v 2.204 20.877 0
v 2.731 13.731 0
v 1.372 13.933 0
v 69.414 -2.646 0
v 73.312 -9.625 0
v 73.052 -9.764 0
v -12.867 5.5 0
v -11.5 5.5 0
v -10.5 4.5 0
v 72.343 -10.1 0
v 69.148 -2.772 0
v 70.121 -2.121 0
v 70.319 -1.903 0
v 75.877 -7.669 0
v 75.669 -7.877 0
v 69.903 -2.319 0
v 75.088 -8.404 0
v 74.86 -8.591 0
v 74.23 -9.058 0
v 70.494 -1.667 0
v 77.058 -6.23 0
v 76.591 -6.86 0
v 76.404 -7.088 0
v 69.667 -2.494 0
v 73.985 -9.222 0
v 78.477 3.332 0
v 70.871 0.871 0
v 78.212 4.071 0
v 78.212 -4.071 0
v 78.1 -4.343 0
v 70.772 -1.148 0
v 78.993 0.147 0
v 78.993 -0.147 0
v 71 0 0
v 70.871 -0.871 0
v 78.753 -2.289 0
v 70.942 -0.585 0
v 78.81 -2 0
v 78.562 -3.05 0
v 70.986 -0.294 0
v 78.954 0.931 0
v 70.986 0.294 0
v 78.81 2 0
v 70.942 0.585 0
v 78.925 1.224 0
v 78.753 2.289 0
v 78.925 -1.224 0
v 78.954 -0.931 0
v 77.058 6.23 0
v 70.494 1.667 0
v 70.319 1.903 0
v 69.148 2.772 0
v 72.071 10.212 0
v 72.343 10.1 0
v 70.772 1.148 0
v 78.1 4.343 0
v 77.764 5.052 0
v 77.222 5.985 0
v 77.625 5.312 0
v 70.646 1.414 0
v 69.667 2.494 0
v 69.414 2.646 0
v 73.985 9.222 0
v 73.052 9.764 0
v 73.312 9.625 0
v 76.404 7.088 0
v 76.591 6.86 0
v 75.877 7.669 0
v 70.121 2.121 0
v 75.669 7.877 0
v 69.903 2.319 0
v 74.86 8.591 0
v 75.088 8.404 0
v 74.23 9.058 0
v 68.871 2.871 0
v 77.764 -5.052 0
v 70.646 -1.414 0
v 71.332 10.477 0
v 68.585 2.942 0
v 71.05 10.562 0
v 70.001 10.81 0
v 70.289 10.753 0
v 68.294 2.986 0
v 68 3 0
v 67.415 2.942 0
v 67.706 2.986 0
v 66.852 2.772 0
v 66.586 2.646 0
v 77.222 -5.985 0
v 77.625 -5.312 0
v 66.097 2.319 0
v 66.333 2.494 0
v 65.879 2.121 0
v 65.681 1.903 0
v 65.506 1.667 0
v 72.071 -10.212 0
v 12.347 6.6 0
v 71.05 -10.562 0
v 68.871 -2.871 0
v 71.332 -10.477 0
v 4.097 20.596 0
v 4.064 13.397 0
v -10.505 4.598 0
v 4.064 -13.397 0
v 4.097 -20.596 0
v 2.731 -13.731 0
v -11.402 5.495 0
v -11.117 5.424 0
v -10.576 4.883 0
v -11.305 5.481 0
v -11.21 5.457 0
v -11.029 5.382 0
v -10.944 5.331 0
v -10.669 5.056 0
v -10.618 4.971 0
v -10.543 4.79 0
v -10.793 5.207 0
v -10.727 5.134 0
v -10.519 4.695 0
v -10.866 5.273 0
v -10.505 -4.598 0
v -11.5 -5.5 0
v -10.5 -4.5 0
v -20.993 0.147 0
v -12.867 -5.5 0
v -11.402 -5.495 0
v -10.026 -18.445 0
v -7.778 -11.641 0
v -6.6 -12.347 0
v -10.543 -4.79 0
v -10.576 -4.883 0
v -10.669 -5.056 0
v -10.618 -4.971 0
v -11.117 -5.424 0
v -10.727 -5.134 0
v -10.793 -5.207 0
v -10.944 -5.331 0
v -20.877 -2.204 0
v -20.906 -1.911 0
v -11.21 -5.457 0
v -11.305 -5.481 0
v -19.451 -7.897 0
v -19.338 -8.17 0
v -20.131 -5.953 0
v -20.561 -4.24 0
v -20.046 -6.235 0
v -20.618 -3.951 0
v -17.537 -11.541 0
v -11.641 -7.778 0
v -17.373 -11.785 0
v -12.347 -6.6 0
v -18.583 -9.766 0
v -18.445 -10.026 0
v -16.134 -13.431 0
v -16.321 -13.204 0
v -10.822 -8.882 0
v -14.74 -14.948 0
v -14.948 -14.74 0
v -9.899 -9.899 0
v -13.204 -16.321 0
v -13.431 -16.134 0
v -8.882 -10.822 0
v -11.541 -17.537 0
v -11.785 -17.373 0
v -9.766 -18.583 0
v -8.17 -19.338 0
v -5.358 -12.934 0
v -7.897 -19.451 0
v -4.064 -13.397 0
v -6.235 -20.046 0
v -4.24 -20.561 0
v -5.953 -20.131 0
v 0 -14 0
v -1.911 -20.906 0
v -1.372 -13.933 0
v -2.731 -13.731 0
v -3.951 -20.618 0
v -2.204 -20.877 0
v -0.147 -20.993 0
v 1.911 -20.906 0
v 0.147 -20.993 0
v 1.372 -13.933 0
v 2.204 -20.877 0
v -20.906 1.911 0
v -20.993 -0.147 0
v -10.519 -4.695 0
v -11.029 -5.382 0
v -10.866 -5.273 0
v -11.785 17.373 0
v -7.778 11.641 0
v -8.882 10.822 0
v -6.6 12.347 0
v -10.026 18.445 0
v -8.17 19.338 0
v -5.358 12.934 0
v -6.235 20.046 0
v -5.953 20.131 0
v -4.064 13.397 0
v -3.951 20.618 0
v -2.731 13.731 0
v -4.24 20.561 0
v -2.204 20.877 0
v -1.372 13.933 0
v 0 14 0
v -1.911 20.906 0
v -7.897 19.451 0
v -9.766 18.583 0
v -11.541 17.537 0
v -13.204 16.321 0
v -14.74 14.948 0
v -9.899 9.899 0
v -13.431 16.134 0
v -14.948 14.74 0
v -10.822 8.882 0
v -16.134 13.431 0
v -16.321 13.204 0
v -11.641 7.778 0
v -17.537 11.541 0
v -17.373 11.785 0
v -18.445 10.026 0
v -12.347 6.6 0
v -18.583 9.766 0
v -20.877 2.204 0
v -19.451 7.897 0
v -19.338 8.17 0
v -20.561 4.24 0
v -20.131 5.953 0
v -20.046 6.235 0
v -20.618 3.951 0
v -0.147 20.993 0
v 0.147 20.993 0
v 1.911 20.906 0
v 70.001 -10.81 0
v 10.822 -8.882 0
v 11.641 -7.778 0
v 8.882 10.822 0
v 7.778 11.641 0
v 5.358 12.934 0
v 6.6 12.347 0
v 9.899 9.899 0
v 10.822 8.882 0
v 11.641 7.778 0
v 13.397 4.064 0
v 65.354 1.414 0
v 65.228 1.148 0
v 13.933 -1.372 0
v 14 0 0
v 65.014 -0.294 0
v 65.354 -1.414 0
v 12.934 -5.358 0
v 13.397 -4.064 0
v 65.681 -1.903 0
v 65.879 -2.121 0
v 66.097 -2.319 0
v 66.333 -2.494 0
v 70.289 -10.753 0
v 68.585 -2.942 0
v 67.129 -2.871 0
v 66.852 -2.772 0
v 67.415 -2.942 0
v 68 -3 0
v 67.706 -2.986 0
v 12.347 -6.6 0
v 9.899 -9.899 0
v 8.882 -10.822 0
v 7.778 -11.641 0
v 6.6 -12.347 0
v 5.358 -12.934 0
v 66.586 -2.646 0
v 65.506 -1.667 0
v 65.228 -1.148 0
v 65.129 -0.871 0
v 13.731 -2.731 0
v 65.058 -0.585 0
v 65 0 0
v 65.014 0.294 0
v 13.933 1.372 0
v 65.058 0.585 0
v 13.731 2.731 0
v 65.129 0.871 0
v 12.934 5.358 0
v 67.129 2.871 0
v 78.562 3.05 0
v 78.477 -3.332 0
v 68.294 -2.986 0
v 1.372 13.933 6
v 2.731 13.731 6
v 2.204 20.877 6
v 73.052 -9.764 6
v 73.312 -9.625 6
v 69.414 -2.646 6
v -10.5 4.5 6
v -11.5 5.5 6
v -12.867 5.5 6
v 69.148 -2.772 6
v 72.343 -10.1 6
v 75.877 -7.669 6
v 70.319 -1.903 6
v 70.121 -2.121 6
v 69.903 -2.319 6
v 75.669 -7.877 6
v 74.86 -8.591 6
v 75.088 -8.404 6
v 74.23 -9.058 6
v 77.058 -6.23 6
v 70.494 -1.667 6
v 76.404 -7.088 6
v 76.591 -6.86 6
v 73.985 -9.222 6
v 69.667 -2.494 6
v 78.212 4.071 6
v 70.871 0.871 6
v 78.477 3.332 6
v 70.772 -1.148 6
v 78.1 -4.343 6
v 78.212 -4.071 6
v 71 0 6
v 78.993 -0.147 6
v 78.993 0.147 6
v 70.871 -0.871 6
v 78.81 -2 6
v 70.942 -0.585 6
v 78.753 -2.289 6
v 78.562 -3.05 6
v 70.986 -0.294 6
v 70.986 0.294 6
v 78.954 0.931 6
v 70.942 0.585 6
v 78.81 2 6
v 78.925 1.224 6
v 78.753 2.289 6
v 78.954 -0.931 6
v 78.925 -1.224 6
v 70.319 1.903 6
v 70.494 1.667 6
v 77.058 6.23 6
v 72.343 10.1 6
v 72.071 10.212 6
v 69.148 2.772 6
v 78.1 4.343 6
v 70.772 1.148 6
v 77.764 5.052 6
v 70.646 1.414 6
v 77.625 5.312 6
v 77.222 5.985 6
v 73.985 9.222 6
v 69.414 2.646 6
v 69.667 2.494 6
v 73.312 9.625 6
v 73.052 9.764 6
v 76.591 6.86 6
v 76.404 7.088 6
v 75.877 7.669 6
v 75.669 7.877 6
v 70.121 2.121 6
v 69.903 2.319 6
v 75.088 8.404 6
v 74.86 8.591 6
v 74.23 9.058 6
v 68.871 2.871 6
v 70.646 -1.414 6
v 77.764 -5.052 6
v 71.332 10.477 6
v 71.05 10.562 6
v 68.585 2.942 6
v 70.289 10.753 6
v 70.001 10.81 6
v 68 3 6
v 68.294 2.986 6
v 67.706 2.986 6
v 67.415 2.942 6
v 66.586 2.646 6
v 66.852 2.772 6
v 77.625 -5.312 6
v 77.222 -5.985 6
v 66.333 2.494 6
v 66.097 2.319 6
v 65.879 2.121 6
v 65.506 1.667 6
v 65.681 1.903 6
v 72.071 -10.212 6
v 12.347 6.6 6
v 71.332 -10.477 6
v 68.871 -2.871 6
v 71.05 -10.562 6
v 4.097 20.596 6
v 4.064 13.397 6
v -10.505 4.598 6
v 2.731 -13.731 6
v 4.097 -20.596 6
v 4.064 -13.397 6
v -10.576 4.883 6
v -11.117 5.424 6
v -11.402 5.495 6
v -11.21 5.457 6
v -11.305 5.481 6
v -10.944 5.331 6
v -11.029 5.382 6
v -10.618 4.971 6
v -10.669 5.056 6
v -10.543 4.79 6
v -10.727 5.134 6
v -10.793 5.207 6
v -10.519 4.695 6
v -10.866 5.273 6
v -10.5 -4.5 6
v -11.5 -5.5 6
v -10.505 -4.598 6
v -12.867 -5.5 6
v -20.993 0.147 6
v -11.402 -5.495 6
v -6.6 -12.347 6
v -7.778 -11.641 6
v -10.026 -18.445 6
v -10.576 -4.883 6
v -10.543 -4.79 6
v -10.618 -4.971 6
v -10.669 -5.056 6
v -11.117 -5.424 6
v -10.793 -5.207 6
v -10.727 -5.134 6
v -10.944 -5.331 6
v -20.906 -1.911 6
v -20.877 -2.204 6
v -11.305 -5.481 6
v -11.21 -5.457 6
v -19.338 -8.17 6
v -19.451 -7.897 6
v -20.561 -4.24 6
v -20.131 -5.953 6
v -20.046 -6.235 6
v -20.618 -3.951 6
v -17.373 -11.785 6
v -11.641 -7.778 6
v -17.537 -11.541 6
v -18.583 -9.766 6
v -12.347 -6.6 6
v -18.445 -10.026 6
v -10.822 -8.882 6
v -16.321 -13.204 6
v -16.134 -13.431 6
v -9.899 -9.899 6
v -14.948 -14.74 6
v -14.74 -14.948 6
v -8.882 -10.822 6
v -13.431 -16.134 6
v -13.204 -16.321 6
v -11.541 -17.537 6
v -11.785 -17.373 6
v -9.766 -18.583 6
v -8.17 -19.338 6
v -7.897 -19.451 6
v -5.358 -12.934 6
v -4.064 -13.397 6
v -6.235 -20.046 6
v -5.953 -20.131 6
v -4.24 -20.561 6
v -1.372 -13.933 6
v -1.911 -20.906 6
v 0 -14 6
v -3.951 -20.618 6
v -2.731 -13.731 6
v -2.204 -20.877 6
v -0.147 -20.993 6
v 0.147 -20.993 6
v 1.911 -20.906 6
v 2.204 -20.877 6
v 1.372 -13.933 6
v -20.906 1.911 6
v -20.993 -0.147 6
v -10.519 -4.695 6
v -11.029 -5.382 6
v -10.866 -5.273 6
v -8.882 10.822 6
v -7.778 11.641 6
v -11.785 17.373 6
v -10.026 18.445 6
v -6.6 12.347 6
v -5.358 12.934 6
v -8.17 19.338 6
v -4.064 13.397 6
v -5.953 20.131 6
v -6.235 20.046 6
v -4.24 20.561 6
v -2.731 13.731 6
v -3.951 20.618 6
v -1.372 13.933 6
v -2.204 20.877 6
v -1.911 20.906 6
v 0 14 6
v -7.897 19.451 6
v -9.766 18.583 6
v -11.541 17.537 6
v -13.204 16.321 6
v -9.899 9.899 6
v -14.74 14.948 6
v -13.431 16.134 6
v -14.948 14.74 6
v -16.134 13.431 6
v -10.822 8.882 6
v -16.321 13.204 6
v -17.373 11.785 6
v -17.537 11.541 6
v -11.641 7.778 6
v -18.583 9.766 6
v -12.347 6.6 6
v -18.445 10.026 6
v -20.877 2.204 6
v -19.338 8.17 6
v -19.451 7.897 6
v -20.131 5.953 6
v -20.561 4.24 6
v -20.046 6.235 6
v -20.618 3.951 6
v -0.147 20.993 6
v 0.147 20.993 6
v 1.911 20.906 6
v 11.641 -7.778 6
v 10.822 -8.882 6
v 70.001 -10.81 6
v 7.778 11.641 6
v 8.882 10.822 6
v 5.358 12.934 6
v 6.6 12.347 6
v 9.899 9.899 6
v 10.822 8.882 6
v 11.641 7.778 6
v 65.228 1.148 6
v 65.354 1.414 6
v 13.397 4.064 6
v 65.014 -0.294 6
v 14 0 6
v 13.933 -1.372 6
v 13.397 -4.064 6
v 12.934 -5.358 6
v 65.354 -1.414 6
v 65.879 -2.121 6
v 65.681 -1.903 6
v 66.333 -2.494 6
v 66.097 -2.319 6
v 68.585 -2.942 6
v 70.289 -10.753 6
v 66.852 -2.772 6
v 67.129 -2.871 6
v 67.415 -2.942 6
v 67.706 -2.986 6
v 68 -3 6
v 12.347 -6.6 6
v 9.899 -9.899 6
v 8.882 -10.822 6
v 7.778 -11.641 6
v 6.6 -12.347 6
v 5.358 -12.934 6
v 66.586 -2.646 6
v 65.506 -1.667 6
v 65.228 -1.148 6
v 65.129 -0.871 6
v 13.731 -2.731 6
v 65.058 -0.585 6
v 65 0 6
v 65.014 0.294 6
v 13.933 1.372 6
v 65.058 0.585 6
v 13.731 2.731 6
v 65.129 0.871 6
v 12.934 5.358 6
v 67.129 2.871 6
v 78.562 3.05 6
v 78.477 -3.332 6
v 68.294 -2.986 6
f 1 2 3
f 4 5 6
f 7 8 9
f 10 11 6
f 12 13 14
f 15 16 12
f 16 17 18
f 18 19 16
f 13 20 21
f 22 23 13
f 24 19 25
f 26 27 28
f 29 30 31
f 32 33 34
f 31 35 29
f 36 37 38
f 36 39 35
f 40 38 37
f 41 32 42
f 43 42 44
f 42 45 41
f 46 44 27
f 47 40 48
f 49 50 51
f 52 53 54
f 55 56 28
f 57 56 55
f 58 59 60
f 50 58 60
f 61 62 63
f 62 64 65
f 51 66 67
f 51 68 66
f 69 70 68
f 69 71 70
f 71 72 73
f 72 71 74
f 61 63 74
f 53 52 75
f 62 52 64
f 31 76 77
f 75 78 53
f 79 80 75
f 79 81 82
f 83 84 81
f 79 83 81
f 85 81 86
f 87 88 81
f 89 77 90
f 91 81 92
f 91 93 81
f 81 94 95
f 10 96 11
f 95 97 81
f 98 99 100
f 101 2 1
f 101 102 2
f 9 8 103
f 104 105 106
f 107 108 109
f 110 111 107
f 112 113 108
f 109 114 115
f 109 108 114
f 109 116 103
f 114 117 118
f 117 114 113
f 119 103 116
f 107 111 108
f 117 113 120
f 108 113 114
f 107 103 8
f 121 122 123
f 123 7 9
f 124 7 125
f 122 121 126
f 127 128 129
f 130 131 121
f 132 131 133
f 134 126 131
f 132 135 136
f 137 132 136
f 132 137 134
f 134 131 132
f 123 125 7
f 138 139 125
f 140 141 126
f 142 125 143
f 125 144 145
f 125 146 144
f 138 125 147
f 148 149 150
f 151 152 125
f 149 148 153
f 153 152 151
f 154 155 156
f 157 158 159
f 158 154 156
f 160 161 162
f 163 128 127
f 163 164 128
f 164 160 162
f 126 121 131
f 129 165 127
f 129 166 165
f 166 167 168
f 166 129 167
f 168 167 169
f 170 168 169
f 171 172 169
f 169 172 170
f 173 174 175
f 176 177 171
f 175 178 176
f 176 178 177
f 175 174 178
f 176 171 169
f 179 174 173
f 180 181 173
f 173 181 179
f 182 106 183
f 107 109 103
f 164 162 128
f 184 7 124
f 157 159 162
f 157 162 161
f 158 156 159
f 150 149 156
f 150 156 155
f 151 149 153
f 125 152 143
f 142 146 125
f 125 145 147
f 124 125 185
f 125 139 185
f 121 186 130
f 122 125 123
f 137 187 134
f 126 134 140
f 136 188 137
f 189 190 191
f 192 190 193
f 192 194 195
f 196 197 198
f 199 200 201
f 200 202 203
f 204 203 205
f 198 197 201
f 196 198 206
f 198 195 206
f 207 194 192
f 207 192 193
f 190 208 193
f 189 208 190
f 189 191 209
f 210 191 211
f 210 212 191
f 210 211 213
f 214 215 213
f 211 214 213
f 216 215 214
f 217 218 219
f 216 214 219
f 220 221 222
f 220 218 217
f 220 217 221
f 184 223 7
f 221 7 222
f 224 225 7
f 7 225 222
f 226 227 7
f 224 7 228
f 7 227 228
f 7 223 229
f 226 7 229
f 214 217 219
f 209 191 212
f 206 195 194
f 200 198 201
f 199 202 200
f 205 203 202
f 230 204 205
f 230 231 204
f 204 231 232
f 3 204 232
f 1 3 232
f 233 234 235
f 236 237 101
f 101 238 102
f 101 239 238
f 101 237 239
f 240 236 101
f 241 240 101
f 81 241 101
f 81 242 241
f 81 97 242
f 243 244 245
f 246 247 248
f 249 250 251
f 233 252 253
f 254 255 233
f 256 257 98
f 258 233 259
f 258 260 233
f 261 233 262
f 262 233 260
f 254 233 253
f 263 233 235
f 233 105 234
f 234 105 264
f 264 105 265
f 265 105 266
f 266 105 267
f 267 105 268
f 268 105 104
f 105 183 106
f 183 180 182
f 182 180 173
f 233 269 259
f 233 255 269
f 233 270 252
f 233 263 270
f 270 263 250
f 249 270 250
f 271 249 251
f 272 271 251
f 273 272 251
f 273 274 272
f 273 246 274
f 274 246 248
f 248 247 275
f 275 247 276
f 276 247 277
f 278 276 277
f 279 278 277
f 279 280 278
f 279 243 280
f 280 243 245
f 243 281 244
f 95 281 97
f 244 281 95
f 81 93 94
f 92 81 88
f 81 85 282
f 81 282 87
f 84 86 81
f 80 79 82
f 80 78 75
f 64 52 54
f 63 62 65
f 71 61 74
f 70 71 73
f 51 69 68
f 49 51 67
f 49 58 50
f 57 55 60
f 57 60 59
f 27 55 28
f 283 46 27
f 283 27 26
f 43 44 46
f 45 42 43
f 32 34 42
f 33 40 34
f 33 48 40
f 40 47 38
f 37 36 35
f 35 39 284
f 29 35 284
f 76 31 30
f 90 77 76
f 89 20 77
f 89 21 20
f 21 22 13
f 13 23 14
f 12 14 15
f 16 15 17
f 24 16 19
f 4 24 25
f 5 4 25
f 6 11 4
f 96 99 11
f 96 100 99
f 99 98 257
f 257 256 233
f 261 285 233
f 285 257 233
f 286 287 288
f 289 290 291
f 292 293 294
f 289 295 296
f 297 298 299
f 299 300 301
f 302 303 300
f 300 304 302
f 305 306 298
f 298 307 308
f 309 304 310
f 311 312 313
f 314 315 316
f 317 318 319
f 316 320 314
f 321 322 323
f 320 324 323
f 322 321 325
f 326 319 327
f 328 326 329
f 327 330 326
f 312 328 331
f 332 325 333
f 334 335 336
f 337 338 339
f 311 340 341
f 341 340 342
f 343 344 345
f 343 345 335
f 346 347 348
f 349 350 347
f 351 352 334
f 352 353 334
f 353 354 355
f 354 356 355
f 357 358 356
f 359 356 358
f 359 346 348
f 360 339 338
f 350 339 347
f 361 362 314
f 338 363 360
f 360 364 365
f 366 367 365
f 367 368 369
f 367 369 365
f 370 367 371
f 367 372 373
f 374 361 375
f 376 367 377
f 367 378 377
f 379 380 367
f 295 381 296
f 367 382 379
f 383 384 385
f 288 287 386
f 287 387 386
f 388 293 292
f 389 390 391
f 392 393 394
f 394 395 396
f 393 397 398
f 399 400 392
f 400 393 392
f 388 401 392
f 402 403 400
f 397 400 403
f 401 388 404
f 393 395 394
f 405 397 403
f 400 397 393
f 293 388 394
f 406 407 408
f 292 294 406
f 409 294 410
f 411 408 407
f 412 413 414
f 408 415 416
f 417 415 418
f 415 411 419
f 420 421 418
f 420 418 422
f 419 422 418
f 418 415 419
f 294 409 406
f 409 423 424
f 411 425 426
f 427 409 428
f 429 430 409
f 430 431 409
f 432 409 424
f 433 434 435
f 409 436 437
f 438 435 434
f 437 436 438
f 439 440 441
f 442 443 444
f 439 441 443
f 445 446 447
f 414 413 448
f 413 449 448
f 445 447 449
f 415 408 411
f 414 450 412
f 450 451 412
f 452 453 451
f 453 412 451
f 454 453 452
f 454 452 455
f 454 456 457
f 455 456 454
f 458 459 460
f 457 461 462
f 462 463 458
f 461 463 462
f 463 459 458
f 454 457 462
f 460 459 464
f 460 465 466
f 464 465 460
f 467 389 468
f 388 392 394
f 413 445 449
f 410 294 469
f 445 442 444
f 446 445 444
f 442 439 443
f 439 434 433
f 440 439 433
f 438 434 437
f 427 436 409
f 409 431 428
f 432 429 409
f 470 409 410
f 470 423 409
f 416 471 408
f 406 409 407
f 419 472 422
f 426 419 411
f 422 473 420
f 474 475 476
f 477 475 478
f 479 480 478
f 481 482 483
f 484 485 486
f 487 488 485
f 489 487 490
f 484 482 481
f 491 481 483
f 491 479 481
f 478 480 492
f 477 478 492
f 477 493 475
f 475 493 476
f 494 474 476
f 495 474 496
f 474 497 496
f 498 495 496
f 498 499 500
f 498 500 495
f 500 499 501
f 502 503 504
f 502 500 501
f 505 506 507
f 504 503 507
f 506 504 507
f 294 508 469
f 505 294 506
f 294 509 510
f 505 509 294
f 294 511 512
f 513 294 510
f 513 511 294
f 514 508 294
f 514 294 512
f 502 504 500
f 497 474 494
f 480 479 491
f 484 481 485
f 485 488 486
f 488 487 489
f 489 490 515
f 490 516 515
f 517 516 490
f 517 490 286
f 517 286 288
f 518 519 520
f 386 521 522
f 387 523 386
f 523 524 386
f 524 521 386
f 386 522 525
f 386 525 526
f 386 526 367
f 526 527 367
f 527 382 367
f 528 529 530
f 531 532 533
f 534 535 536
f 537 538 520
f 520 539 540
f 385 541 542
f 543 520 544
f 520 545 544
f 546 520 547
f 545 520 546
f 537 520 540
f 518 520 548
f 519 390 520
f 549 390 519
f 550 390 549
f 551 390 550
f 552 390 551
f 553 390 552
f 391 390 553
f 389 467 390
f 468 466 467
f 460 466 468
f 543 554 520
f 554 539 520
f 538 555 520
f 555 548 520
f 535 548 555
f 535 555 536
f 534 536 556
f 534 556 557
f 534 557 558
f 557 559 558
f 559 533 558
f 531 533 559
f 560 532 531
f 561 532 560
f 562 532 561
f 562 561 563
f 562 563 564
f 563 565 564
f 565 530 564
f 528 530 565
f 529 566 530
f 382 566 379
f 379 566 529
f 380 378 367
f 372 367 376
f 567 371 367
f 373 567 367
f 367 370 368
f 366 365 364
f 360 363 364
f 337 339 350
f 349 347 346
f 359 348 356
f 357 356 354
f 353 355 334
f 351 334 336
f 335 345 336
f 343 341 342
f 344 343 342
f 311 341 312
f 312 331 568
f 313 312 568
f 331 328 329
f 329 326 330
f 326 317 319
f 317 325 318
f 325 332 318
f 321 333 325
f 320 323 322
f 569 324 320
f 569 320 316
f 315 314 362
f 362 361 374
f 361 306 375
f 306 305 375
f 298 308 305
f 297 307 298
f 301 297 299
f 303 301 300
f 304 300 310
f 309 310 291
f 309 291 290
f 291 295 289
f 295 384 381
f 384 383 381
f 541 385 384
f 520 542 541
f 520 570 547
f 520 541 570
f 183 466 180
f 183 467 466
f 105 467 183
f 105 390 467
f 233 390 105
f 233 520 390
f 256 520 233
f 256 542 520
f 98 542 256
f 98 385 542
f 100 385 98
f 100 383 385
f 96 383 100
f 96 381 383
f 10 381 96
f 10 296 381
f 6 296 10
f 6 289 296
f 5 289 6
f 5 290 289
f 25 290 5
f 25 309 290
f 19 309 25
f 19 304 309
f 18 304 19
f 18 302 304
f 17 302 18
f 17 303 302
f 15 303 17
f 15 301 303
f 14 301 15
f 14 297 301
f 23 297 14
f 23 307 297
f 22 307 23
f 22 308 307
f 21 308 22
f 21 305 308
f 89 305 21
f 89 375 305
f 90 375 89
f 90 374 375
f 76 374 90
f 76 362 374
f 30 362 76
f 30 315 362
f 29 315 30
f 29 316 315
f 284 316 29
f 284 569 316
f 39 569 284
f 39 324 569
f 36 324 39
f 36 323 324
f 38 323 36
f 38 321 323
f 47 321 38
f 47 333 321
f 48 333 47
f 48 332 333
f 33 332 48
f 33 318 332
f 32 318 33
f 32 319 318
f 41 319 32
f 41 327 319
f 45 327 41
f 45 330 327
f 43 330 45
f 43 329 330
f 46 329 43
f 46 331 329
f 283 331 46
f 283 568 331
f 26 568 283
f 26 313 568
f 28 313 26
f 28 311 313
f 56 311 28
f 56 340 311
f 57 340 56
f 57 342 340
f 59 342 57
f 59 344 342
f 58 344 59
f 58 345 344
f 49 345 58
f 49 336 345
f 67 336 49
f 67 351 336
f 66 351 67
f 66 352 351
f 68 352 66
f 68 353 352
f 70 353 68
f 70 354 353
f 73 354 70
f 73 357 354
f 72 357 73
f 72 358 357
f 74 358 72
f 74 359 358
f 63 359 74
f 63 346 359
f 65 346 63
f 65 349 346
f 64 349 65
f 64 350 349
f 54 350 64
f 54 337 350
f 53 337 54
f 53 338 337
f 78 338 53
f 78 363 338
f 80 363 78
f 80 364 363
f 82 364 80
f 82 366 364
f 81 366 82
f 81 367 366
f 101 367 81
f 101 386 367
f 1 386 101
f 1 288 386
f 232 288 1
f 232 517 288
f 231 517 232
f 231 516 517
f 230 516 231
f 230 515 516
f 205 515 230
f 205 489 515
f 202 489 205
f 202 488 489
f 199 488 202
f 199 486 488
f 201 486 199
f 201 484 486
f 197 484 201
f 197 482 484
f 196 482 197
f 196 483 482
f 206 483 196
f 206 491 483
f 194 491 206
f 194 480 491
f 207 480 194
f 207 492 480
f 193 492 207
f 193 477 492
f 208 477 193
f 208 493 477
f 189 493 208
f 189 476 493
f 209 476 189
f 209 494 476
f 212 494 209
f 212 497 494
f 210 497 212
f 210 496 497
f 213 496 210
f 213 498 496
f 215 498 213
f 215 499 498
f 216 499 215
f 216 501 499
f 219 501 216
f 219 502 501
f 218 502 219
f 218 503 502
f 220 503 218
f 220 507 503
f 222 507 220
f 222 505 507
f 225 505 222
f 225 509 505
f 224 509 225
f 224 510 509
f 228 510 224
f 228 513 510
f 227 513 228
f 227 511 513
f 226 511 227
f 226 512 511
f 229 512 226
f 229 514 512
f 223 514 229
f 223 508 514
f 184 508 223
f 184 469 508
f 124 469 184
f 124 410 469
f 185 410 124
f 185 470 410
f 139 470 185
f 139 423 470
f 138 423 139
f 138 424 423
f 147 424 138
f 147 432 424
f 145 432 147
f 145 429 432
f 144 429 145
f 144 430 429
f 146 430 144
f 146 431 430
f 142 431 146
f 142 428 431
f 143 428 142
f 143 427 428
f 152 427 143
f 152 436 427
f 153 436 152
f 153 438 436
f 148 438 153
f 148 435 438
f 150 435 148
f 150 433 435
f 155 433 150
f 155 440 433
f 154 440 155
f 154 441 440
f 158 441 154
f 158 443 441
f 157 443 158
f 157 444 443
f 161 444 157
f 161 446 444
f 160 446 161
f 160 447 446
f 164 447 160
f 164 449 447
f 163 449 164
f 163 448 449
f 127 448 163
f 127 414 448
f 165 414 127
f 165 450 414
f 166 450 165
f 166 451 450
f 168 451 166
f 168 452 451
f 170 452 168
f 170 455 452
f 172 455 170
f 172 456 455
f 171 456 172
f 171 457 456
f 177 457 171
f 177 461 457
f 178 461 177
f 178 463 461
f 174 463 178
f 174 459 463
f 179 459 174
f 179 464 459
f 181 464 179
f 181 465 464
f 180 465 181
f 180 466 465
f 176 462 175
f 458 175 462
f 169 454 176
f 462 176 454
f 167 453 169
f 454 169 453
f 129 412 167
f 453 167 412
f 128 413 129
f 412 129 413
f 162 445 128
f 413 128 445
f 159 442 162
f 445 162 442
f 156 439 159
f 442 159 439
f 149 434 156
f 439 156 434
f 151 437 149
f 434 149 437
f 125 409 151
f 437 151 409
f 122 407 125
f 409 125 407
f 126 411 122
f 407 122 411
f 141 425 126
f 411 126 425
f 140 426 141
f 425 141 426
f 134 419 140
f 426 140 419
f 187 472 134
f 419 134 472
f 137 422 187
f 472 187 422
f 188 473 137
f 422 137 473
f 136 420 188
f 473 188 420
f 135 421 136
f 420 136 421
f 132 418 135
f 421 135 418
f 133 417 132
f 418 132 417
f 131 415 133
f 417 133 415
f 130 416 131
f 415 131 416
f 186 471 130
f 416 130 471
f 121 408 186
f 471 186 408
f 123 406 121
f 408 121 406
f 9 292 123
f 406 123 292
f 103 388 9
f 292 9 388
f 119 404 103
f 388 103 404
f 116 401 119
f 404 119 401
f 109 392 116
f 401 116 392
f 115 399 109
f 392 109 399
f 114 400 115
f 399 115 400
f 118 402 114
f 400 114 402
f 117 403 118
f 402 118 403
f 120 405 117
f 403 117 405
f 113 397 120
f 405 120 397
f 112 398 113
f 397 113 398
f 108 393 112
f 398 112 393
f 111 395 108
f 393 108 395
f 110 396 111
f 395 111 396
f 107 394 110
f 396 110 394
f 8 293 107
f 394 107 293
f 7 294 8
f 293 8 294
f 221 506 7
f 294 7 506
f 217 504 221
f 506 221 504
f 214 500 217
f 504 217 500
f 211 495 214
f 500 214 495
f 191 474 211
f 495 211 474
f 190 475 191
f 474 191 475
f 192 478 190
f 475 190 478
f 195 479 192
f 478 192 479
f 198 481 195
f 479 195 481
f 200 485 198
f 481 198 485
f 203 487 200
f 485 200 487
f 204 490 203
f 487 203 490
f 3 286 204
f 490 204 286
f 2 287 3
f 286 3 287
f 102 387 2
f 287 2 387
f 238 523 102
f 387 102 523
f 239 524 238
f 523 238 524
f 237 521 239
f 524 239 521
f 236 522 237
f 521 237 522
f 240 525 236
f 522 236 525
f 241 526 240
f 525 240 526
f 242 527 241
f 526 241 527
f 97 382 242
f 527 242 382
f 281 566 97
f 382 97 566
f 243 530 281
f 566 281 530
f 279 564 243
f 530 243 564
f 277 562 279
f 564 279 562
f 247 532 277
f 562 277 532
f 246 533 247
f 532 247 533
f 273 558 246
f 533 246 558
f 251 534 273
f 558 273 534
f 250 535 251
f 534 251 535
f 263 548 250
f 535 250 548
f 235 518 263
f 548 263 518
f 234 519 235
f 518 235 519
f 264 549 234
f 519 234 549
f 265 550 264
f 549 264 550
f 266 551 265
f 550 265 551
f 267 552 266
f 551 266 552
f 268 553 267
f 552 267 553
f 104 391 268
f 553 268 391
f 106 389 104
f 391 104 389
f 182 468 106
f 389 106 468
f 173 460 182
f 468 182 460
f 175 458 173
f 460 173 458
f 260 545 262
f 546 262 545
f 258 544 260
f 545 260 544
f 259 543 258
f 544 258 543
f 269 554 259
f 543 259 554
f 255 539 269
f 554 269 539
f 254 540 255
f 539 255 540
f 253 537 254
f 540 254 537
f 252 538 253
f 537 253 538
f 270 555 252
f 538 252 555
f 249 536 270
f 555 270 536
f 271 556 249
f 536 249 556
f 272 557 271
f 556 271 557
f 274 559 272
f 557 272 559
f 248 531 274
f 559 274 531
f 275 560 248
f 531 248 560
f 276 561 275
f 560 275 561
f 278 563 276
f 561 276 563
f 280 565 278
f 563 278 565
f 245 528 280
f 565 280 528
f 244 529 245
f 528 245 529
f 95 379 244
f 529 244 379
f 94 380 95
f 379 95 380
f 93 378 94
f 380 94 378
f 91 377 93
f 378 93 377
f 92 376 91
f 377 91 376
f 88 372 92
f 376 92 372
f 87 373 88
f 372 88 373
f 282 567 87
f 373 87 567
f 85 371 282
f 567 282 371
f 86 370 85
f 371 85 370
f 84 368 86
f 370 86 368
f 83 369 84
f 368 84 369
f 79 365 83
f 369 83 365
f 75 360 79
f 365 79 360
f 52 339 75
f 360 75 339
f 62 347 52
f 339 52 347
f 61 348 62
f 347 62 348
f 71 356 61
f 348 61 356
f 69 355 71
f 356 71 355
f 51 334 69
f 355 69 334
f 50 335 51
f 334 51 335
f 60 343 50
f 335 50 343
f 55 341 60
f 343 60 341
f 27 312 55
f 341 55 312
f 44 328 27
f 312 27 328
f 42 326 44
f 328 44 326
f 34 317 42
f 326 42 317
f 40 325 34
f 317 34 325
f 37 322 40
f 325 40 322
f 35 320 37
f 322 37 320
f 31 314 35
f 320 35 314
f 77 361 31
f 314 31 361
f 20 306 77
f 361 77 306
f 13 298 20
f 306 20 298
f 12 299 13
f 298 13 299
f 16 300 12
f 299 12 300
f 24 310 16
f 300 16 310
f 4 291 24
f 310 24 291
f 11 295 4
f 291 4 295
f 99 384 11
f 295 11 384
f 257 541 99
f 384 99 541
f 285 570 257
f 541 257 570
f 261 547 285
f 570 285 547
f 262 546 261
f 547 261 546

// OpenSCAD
// Открывашка для бутылок: зуб в окне головки цепляет край пробки,
// край окна упирается в её верх — рычаг поднимает пробку.
// Пробка 26 мм (кроненпробка). Печатать из PETG или PLA, заполнение 100%.
$fn = 64;

/* [Открывашка] */
// Длина, мм
length = 100;           // [70:5:150]
// Ширина ручки, мм
handle = 22;            // [16:1:34]
// Толщина, мм
thickness = 6;          // [5:0.5:10]
/* [Окно под пробку] */
// Диаметр окна, мм
opening = 28;           // [26:0.5:32]
// Вылет зуба, мм
tooth = 3.5;            // [2:0.5:6]
// Ширина зуба, мм
tooth_width = 11;       // [6:1:16]
/* [Подвес] */
// Отверстие на ручке, мм
hang_hole = 6;          // [0:0.5:10]

// Ободок вокруг окна — четверть его диаметра (7 мм при 28).
rim = opening / 4;
head = opening + 2 * rim;

module outline() {
    // Внешние углы скруглены, переход головки в ручку плавный.
    offset(r = -6) offset(r = 6)
        hull() {
            circle(d = head);
            translate([length - head / 2 - handle / 2, 0]) circle(d = handle);
        }
}

module window() {
    difference() {
        circle(d = opening);
        // Зуб — со стороны, дальней от ручки.
        translate([-opening / 2 - 1, -tooth_width / 2])
            offset(r = 1) offset(r = -1)
                square([tooth + 1, tooth_width]);
    }
}

linear_extrude(height = thickness)
    difference() {
        outline();
        window();
        if (hang_hole > 0)
            translate([length - head / 2 - handle / 2, 0]) circle(d = hang_hole);
    }
